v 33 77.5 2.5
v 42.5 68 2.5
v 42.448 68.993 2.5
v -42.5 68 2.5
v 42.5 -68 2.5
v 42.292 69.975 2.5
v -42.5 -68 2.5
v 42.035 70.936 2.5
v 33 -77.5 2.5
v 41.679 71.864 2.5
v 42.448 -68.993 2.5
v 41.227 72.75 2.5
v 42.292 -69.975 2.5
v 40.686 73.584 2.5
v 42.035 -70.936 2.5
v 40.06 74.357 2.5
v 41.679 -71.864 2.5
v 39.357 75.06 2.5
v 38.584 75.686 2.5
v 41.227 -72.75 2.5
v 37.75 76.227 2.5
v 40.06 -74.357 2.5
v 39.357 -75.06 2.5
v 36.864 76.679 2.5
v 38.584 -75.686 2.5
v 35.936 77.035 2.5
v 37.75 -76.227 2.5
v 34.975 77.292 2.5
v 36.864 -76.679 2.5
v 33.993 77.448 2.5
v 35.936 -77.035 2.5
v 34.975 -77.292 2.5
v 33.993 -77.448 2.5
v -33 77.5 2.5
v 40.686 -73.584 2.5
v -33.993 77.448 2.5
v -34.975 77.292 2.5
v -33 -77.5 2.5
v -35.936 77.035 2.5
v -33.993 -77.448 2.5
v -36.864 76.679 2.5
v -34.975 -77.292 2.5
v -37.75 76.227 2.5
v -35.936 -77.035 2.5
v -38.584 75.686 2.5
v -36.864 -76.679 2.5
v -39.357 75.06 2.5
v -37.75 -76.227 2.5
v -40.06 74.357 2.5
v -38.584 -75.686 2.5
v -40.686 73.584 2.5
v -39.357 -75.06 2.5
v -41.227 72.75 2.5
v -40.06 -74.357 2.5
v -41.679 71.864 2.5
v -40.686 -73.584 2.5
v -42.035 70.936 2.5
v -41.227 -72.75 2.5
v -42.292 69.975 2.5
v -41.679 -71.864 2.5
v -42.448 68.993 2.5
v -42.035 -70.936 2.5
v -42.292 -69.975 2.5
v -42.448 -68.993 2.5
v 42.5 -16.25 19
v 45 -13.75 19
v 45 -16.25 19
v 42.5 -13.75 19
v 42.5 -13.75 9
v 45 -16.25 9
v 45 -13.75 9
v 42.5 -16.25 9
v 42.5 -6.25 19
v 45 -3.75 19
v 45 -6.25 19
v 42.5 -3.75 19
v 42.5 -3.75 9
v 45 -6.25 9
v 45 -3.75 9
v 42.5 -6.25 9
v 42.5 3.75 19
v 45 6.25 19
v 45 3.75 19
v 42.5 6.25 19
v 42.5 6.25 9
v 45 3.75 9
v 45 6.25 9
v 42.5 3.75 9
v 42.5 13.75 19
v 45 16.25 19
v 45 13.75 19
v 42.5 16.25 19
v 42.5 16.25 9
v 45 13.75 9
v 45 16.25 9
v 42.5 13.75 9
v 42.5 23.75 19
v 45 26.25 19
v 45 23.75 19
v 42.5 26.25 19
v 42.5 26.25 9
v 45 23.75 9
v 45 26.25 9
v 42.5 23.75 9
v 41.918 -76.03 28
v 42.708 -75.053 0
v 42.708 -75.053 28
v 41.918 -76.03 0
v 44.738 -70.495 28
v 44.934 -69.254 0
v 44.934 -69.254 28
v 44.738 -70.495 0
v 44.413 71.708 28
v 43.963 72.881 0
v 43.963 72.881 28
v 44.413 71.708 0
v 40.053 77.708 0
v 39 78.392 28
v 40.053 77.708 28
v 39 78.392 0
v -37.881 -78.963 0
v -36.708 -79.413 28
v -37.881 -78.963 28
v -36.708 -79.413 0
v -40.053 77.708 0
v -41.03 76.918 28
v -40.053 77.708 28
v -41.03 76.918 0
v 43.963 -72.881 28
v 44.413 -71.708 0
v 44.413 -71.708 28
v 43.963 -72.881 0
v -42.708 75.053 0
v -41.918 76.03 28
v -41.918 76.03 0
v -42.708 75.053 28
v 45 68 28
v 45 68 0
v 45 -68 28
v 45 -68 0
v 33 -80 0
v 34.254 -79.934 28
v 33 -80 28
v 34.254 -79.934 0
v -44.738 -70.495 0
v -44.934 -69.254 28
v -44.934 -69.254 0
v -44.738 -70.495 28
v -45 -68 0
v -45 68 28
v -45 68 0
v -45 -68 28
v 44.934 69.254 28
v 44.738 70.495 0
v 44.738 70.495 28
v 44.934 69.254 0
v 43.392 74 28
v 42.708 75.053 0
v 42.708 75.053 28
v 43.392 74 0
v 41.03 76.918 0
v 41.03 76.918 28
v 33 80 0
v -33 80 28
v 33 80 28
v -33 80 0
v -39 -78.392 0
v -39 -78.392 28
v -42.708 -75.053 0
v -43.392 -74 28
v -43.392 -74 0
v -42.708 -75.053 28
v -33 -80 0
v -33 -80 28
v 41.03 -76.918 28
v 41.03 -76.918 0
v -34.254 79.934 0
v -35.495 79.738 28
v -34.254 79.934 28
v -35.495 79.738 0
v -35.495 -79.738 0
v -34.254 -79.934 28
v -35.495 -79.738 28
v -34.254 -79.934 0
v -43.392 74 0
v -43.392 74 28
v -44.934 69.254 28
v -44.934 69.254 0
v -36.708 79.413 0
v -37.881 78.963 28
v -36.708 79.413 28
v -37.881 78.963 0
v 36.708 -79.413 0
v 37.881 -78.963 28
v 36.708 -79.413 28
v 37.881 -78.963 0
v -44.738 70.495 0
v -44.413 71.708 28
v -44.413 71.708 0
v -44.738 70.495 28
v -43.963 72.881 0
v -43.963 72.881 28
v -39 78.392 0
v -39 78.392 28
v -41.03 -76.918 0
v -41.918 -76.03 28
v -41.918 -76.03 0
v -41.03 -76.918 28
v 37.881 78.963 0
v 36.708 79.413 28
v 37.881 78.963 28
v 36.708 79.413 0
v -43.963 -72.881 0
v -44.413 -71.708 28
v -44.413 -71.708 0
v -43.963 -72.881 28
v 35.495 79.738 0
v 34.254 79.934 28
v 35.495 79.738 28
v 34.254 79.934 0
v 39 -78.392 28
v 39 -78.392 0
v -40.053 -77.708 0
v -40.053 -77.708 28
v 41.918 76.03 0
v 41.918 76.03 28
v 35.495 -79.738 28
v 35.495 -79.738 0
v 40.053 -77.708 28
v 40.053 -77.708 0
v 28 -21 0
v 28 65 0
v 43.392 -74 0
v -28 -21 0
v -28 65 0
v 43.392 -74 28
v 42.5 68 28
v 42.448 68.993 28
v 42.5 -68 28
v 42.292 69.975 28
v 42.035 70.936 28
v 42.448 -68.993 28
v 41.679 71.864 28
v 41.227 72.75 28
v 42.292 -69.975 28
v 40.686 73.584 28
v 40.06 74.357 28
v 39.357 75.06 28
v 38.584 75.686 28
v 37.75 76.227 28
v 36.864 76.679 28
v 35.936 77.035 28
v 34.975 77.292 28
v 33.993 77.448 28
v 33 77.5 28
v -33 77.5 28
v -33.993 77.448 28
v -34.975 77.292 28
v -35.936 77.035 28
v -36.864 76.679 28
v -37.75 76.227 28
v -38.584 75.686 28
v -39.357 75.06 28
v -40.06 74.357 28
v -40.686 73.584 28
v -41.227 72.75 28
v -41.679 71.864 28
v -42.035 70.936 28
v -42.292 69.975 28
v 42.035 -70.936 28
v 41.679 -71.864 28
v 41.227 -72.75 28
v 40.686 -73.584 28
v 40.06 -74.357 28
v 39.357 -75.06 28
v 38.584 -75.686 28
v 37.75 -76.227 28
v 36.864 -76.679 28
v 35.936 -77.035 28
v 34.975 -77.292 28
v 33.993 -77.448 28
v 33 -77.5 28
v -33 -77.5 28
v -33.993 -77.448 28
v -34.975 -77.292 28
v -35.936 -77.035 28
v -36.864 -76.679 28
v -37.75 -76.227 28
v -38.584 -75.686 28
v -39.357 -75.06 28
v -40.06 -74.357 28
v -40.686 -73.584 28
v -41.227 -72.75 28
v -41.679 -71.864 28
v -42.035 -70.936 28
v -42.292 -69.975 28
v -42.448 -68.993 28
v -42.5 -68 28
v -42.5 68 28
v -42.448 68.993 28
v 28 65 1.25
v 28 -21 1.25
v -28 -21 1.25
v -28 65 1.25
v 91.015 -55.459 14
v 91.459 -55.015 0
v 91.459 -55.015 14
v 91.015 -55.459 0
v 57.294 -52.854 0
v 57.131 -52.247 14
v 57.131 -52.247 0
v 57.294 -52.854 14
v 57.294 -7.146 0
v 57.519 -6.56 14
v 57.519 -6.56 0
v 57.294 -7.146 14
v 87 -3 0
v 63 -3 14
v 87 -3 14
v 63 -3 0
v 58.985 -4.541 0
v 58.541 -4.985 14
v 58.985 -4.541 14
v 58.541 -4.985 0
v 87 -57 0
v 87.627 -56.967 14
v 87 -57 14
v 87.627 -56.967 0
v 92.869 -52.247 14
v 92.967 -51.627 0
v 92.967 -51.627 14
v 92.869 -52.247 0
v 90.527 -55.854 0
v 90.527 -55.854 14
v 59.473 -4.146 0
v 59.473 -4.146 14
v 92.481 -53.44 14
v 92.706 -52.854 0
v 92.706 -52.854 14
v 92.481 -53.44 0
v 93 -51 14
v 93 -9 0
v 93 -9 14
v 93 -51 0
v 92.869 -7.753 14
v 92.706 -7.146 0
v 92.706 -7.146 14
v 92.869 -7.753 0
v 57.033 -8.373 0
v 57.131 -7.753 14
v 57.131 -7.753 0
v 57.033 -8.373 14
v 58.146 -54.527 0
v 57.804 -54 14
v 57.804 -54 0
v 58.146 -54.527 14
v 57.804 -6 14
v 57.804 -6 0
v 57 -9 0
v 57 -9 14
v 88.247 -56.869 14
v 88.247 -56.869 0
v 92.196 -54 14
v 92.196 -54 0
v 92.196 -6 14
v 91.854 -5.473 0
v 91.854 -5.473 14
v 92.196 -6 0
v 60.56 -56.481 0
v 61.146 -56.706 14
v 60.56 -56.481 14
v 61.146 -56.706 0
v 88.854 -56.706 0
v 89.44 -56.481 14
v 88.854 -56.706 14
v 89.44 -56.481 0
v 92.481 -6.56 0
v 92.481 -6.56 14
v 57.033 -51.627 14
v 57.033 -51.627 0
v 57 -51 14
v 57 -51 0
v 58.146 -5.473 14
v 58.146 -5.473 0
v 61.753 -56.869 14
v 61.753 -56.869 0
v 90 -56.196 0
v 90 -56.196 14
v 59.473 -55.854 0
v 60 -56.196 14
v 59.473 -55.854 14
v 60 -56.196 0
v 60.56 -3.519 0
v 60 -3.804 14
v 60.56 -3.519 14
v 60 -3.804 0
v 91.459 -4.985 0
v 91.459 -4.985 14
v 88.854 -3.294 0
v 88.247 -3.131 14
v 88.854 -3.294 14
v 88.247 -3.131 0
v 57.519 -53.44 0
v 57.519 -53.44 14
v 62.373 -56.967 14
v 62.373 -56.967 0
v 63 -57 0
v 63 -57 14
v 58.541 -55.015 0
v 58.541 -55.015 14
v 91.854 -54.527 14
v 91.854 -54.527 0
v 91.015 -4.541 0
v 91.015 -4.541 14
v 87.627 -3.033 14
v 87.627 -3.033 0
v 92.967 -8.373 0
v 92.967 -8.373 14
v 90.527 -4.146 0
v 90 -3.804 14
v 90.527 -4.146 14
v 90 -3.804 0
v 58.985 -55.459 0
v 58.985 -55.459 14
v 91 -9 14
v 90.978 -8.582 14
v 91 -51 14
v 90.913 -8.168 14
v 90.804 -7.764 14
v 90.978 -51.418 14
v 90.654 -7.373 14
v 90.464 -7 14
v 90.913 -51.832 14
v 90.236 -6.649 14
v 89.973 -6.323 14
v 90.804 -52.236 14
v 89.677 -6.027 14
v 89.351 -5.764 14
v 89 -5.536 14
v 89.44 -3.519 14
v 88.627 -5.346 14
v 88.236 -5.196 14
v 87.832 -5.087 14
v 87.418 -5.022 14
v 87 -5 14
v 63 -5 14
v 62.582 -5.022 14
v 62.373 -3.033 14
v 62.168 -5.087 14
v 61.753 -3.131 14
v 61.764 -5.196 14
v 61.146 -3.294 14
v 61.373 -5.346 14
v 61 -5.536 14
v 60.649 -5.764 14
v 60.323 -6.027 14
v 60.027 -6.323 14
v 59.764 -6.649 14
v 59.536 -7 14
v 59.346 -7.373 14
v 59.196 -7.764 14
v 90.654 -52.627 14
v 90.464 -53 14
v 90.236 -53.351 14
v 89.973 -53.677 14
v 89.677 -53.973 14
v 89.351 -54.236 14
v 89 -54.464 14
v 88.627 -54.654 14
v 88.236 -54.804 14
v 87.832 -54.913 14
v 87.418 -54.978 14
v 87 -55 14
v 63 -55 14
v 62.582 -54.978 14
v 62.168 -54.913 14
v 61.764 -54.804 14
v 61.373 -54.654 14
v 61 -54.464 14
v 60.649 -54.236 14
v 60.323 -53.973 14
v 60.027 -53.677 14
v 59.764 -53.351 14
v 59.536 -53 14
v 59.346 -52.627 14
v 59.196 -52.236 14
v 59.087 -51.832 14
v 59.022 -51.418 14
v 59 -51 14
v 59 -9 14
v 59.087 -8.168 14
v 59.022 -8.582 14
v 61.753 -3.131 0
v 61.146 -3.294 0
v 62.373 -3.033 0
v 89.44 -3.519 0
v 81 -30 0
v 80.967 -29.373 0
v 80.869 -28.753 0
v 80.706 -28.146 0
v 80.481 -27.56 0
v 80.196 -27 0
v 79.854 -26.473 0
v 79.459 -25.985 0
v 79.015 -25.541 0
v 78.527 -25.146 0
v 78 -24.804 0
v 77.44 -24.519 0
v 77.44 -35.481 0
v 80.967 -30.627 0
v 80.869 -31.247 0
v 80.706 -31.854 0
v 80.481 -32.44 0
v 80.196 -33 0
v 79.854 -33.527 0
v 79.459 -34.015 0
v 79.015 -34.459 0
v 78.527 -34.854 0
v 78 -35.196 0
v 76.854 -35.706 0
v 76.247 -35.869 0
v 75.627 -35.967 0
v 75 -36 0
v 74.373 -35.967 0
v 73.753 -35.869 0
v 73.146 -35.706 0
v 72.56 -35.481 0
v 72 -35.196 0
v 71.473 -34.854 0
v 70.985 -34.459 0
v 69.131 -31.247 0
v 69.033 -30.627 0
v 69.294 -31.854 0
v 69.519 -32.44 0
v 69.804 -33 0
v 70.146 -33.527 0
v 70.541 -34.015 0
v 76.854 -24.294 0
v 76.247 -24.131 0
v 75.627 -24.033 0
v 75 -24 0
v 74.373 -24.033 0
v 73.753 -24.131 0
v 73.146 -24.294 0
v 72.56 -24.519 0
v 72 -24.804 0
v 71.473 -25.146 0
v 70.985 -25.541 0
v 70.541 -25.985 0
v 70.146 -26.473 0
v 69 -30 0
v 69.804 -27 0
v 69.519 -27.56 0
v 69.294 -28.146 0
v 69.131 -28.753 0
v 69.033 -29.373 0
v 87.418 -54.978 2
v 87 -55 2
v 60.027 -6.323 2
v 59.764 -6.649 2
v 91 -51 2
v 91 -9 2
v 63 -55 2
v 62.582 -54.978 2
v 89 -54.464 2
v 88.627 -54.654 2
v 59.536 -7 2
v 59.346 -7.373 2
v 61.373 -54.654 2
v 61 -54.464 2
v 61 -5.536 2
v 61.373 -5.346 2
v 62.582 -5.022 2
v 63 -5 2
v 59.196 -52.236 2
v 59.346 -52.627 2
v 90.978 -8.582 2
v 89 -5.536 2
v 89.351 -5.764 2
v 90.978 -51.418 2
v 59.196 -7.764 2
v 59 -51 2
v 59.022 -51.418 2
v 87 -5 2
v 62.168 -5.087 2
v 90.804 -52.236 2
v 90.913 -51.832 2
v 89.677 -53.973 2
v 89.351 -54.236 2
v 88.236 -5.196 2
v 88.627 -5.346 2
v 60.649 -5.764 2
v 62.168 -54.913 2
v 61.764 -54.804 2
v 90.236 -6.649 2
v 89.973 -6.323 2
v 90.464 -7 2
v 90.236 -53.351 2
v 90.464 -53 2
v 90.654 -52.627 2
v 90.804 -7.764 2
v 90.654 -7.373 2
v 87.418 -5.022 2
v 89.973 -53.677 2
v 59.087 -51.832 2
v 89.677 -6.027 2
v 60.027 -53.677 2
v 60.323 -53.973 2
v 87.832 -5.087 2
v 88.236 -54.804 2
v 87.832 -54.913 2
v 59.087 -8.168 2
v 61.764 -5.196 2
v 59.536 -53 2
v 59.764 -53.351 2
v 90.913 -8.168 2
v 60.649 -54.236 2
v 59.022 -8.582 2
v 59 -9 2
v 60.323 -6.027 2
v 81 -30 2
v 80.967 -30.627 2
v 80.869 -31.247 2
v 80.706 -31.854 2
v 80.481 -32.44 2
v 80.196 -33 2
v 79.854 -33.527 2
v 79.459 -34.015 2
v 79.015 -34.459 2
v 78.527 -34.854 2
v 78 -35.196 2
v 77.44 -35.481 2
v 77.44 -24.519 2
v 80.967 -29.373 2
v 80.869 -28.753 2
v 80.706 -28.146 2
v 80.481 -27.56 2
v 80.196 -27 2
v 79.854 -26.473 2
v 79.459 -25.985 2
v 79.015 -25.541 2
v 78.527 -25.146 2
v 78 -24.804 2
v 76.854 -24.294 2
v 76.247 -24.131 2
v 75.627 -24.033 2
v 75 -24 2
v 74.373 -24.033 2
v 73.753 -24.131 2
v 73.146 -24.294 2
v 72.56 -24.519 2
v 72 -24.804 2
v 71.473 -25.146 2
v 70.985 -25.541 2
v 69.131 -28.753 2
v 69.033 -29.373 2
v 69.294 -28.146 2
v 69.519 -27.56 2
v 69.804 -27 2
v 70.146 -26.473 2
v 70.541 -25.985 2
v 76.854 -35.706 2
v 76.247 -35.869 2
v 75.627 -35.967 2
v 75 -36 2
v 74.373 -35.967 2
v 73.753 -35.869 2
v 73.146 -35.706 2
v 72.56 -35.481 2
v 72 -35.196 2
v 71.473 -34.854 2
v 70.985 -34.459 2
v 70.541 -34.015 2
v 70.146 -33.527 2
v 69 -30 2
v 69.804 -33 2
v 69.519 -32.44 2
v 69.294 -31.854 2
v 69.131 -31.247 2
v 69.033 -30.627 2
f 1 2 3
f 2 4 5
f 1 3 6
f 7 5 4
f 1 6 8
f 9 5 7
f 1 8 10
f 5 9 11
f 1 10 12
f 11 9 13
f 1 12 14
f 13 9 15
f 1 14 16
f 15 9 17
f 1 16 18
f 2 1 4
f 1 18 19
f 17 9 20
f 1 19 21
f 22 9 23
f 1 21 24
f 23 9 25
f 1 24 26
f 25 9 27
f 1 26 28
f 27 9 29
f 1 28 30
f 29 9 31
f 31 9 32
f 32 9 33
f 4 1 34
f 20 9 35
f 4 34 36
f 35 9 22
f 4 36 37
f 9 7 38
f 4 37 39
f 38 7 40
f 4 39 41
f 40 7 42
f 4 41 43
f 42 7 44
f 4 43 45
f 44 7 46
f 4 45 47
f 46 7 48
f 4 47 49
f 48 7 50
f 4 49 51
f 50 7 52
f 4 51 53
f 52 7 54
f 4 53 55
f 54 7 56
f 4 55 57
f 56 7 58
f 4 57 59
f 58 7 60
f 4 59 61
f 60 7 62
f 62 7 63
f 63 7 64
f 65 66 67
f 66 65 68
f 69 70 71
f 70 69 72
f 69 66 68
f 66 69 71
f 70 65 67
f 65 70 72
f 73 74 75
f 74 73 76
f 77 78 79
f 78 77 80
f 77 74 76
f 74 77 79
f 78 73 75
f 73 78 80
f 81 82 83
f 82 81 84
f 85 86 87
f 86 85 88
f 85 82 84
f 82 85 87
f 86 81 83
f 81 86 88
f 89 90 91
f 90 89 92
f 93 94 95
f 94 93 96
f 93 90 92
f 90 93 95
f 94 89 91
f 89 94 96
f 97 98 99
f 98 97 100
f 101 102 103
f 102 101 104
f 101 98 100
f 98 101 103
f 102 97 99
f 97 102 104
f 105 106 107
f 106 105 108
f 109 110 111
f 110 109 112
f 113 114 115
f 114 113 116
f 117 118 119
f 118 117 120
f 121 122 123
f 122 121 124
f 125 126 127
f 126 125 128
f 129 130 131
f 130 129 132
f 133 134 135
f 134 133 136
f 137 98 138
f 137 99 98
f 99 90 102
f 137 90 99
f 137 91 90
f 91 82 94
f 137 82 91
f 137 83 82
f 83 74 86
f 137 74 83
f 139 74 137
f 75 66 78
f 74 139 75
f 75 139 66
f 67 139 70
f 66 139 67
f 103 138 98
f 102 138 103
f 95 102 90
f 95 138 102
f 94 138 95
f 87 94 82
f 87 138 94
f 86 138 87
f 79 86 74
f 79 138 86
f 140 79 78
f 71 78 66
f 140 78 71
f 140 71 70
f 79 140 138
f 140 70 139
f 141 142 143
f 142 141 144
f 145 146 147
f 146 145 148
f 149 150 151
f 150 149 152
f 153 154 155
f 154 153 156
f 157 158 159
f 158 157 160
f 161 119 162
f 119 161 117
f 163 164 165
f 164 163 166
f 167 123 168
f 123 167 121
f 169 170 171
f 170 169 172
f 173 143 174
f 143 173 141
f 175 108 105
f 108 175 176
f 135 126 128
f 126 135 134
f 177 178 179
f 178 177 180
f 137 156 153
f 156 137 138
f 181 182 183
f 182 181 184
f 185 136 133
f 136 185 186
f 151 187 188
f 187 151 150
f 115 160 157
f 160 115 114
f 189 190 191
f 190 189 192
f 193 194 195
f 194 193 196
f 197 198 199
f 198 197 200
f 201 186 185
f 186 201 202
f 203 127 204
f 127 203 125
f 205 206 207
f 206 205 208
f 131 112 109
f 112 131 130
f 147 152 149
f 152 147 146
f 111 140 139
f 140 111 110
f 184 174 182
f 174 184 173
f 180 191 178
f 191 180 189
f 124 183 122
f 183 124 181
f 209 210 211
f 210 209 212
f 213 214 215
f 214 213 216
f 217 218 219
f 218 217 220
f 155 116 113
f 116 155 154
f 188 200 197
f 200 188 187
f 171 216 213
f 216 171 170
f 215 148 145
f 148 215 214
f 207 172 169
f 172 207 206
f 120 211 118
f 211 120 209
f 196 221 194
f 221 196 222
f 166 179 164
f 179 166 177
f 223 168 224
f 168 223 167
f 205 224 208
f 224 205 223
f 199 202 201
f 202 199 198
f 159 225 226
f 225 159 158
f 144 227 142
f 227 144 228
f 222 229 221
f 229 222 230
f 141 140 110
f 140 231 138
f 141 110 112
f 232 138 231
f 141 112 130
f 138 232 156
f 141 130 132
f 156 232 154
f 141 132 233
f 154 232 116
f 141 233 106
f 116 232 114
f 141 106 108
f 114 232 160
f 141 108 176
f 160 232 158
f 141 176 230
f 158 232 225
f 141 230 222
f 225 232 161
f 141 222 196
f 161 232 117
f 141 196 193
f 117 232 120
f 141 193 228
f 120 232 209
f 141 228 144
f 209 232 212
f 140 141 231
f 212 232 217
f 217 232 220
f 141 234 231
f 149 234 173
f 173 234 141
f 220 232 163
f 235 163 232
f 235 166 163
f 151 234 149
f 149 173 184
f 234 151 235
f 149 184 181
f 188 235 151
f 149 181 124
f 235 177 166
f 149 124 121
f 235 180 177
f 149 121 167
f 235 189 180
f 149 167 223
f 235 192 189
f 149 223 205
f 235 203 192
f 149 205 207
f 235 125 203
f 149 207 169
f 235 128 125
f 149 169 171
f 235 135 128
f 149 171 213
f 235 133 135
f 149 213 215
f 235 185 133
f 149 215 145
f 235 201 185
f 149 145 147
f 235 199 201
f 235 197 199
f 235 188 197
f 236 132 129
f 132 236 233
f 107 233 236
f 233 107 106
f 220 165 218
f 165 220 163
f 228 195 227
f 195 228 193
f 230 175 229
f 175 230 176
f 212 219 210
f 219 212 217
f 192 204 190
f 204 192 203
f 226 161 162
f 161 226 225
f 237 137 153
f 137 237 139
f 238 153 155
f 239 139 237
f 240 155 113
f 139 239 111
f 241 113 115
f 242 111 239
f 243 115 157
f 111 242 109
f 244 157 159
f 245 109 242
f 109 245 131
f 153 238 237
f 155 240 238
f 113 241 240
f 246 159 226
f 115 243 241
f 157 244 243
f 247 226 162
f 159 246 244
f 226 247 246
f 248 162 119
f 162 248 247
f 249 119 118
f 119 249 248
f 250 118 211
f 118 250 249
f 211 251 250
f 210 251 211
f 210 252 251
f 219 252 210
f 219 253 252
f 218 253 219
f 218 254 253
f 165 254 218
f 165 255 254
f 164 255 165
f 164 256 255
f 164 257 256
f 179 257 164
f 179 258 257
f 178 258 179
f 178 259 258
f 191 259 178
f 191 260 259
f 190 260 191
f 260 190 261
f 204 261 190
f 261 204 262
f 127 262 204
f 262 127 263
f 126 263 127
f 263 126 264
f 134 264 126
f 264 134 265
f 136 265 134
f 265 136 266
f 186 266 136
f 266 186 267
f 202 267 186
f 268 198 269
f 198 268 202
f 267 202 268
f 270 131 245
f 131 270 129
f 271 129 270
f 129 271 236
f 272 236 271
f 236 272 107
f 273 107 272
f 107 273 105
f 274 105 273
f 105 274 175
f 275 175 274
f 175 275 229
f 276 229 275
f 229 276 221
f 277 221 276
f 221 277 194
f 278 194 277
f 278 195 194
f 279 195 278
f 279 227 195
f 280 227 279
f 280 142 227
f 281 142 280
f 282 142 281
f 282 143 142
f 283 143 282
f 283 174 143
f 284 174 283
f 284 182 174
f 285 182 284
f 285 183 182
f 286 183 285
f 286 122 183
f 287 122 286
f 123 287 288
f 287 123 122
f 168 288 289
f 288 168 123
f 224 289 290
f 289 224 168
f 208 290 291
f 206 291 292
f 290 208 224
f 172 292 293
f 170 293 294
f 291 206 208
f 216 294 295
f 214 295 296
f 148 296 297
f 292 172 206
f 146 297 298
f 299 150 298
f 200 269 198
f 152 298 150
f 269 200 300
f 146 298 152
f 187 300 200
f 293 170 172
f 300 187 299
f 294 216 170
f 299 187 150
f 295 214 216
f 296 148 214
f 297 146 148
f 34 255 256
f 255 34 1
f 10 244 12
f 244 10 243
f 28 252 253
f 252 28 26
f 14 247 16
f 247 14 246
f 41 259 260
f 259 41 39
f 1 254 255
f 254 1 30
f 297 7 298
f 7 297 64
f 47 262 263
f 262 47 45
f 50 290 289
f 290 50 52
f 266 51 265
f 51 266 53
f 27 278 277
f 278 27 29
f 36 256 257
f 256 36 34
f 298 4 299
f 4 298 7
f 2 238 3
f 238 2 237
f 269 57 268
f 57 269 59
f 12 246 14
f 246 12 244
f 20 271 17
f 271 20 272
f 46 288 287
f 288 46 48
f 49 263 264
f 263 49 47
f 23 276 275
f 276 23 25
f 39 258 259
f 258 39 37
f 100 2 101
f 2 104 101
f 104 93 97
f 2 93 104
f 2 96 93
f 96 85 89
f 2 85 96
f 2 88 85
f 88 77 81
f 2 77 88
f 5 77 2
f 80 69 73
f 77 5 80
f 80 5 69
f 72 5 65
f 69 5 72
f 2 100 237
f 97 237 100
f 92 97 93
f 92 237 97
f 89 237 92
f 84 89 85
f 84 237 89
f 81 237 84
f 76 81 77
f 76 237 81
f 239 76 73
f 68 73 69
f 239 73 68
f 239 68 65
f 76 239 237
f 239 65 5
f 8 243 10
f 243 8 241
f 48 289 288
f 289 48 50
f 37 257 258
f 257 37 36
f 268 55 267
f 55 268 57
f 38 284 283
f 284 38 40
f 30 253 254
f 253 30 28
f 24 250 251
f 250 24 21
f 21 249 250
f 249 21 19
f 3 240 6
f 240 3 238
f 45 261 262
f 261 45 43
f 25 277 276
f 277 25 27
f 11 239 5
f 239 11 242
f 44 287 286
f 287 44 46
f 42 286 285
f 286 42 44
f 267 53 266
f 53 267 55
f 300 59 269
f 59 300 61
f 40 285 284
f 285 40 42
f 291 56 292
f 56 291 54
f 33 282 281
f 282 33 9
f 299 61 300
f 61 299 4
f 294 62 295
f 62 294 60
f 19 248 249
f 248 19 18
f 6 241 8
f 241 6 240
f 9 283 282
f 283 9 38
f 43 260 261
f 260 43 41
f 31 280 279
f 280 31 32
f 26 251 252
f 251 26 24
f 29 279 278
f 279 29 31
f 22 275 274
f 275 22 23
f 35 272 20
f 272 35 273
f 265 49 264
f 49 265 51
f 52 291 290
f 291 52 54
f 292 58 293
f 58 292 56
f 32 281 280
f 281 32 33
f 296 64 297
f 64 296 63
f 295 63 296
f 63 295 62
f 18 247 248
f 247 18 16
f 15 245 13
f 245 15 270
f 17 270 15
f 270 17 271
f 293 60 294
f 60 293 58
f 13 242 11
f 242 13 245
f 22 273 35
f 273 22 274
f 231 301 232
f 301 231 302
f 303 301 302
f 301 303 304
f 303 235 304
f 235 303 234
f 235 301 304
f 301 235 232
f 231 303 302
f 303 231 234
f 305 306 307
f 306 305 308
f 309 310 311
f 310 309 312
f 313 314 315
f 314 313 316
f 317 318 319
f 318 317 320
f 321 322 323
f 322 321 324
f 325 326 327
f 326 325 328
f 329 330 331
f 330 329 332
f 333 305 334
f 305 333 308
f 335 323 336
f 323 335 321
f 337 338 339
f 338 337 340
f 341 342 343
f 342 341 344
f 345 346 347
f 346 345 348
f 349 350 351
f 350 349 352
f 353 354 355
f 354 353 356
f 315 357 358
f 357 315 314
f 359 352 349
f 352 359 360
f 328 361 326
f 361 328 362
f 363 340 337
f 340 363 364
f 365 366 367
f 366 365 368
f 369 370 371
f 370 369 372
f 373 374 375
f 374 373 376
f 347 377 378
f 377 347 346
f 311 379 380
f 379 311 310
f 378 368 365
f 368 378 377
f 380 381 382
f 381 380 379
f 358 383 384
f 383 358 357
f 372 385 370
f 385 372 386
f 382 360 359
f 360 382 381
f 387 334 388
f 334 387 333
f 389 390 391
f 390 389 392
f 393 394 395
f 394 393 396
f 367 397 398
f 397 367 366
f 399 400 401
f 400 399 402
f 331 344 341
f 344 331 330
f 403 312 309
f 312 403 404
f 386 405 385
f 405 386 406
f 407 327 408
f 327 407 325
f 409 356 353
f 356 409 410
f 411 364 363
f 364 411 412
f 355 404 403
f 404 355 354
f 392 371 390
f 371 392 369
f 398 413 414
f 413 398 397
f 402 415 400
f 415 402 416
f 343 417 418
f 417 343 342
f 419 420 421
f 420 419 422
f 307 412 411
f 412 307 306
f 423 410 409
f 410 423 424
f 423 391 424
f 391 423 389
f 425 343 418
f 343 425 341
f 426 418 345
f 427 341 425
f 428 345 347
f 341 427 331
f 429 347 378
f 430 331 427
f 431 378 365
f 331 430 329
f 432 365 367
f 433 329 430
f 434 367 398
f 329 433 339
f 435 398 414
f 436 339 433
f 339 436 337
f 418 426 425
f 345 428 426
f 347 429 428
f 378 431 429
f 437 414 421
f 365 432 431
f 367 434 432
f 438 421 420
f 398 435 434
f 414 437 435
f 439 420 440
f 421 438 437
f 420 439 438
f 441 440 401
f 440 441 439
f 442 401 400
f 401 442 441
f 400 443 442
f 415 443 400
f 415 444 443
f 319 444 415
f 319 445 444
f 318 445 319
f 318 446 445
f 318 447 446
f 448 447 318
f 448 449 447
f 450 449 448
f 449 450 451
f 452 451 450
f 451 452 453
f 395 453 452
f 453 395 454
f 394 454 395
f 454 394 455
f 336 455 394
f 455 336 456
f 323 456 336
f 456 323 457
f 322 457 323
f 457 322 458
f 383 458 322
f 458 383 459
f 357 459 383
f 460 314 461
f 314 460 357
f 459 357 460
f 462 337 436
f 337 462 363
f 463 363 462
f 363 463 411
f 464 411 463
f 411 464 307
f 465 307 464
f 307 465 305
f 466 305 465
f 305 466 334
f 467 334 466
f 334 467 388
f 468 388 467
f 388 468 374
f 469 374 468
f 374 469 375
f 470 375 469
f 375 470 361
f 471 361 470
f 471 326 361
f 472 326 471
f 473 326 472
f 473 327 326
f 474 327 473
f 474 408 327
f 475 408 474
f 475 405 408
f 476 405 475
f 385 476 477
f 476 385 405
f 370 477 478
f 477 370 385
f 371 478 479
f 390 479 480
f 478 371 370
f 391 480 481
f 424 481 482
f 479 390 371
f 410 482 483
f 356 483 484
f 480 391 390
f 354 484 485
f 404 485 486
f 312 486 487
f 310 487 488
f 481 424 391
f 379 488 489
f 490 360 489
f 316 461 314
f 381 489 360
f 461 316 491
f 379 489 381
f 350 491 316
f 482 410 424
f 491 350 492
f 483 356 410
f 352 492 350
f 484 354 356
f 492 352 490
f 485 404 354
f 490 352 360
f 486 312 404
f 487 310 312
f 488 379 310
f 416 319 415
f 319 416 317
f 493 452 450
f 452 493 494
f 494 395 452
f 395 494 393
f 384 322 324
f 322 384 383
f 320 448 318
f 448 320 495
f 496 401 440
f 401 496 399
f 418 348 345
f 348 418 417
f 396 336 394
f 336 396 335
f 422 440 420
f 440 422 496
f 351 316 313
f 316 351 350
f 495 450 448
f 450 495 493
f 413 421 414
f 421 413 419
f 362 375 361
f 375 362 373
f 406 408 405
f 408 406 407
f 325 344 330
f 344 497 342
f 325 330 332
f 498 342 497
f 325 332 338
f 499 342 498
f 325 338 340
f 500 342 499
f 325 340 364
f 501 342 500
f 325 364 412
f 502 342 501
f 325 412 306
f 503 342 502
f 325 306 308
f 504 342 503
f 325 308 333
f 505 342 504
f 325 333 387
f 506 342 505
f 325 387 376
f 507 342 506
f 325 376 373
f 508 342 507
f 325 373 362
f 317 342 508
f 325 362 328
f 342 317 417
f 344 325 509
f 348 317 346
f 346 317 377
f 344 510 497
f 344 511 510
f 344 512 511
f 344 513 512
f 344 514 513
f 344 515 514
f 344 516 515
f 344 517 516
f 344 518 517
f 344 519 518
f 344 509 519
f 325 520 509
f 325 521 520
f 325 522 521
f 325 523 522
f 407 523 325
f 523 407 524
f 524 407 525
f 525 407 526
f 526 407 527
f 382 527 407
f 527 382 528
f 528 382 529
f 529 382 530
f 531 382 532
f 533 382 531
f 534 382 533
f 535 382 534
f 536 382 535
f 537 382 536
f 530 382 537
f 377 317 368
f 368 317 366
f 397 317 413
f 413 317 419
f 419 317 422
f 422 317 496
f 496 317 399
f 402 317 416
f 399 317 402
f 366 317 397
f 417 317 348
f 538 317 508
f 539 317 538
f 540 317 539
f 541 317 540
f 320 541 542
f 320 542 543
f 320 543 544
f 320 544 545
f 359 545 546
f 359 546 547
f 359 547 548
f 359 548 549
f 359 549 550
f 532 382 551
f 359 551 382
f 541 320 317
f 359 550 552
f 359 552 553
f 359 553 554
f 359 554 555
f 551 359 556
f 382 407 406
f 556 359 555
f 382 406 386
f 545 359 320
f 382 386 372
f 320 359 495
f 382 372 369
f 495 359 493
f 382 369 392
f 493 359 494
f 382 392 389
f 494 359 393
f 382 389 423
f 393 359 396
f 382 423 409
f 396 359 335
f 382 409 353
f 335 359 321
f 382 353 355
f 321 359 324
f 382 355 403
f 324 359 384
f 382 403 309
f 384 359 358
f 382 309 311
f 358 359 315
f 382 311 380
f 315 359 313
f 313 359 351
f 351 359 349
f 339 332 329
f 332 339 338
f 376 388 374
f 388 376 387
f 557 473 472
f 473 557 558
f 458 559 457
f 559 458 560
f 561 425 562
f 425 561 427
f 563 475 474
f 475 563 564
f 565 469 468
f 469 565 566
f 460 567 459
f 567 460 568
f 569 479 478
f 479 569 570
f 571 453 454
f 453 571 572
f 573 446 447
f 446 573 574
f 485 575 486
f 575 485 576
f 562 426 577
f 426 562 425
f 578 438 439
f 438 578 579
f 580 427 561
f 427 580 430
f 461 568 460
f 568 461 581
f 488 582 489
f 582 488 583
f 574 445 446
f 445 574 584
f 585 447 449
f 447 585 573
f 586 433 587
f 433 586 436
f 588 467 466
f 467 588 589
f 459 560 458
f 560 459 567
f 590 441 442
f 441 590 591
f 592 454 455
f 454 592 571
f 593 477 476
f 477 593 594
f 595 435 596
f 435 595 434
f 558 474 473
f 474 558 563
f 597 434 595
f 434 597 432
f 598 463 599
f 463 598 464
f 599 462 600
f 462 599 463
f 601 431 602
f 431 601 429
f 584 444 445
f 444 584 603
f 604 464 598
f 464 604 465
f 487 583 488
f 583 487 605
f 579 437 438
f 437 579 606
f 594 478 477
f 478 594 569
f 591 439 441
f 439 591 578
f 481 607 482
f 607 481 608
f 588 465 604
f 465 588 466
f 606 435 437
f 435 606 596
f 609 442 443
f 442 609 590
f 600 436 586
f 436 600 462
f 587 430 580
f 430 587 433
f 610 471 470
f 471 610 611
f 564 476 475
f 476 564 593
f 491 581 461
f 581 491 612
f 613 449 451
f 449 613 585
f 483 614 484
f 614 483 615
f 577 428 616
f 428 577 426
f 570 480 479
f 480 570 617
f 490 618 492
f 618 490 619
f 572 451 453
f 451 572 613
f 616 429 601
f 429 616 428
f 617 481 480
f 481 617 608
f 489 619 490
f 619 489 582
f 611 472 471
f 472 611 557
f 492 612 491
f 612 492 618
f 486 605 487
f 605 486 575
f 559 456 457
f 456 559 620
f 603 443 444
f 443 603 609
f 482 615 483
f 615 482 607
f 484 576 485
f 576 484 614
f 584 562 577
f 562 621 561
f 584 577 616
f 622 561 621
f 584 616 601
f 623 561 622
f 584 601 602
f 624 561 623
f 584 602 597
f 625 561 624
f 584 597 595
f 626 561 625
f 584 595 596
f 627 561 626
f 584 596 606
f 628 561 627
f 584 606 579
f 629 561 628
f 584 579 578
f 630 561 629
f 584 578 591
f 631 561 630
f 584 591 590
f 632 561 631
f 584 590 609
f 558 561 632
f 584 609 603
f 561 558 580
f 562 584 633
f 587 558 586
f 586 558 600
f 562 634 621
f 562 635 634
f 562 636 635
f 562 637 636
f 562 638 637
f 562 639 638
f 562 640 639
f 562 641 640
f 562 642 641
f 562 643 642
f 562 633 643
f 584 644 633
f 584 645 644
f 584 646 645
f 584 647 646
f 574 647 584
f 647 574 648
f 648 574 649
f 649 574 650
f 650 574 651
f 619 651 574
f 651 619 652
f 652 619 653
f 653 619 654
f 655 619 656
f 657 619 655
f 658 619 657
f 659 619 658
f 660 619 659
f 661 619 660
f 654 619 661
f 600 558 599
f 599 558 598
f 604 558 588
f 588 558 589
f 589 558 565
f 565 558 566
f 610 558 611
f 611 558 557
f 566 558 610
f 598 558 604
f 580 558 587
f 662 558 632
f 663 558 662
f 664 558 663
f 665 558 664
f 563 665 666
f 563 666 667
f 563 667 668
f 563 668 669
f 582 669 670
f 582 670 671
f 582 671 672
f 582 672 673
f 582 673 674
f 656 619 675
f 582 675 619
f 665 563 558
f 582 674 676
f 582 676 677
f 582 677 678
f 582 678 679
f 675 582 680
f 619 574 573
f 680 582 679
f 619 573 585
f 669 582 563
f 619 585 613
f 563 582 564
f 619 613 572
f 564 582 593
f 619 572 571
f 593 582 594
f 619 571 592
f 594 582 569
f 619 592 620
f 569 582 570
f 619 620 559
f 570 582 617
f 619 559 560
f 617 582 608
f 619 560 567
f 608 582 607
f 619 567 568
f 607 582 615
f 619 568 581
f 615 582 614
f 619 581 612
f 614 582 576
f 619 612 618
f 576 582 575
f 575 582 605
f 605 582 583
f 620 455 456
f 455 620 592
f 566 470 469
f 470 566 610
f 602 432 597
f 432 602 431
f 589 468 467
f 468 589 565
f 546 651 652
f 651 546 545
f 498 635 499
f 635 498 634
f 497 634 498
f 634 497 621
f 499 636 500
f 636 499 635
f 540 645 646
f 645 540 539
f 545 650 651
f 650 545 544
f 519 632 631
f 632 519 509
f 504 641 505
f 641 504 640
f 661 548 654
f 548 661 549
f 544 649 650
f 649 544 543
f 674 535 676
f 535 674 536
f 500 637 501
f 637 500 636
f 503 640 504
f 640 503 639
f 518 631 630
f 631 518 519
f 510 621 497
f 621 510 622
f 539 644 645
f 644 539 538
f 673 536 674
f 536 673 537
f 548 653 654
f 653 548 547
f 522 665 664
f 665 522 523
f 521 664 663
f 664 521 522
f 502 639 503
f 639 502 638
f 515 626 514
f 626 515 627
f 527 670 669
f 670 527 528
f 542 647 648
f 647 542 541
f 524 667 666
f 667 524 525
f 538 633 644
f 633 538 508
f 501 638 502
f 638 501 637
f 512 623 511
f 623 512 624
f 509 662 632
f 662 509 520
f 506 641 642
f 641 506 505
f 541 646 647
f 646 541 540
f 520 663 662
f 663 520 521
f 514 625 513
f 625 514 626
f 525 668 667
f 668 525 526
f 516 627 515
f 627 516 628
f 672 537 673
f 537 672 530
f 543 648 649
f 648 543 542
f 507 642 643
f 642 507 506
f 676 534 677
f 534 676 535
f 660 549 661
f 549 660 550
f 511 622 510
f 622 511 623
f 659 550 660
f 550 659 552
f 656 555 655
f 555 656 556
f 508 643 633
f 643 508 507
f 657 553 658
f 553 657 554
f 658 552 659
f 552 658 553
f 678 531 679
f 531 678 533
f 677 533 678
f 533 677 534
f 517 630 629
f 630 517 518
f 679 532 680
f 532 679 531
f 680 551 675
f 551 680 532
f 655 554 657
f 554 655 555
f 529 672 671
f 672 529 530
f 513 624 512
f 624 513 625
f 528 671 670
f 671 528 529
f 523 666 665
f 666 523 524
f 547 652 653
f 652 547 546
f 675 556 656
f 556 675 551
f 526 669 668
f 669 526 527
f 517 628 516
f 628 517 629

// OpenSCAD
// RT Hexadecimal + Snap-Circuit Medical Scanner Chassis (OpenSCAD)
// Integrates shocks.scad isolation mounts & RT thermal venting
$fn = 60;

// Main Handheld Dimensions (mm)
body_w = 90;
body_h = 160;
body_d = 28;
corner_r = 12;
wall = 2.5;

// Touchscreen & Snap-Circuit Buffer Bay
scr_w = 56;
scr_h = 86;
bay_w = 42;
bay_h = 24;
bay_d = 8;

module rounded_body(w, h, d, r) {
    hull() {
        for (x = [-w/2 + r, w/2 - r])
            for (y = [-h/2 + r, h/2 - r])
                translate([x, y, 0])
                    cylinder(h = d, r = r);
    }
}

// Shock-isolated pocket for Node A Double Latch Gate Buffer
module snap_buffer_bay() {
    difference() {
        cube([bay_w, bay_h, bay_d], center = true);
        // Corner mounts for shocks.scad rubber grommets
        for (x = [-bay_w/2 + 3, bay_w/2 - 3])
            for (y = [-bay_h/2 + 3, bay_h/2 - 3])
                translate([x, y, 0])
                    cylinder(h = bay_d + 2, r = 2.2, center = true);
    }
}

module main_scanner_chassis() {
    difference() {
        rounded_body(body_w, body_h, body_d, corner_r);
        
        // Internal cavity for 8-layer RT PCB + 3D Vapor Chamber
        translate([0, 0, wall])
            rounded_body(body_w - wall*2, body_h - wall*2, body_d, corner_r - wall);
            
        // Front Touchscreen Cutout
        translate([0, 22, -1])
            cube([scr_w, scr_h, wall + 2], center = true);
            
        // Lower Internal Recess for Snap-Circuit Buffer & Optical Transceiver
        translate([0, -48, wall + bay_d/2])
            snap_buffer_bay();
            
        // RT Centrifugal Exhaust Louvers
        for (y = [-15, -5, 5, 15, 25]) {
            translate([body_w/2 - wall/2, y, body_d/2])
                cube([wall + 2, 2.5, 10], center = true);
        }
    }
}

// Detachable Remote Sensor Pod (e.g., Blood Analyzer / Gut Monitor)
module remote_sensor_pod(pod_w = 36, pod_h = 54, pod_d = 14) {
    difference() {
        rounded_body(pod_w, pod_h, pod_d, 6);
        translate([0, 0, 2])
            rounded_body(pod_w - 4, pod_h - 4, pod_d, 4);
        // Sensor aperture on bottom face
        translate([0, 0, -1])
            cylinder(h = 4, r = 6);
    }
}

// Render Main Unit + Detached Sensor Pod side-by-side
main_scanner_chassis();
translate([75, -30, 0])
    remote_sensor_pod();
